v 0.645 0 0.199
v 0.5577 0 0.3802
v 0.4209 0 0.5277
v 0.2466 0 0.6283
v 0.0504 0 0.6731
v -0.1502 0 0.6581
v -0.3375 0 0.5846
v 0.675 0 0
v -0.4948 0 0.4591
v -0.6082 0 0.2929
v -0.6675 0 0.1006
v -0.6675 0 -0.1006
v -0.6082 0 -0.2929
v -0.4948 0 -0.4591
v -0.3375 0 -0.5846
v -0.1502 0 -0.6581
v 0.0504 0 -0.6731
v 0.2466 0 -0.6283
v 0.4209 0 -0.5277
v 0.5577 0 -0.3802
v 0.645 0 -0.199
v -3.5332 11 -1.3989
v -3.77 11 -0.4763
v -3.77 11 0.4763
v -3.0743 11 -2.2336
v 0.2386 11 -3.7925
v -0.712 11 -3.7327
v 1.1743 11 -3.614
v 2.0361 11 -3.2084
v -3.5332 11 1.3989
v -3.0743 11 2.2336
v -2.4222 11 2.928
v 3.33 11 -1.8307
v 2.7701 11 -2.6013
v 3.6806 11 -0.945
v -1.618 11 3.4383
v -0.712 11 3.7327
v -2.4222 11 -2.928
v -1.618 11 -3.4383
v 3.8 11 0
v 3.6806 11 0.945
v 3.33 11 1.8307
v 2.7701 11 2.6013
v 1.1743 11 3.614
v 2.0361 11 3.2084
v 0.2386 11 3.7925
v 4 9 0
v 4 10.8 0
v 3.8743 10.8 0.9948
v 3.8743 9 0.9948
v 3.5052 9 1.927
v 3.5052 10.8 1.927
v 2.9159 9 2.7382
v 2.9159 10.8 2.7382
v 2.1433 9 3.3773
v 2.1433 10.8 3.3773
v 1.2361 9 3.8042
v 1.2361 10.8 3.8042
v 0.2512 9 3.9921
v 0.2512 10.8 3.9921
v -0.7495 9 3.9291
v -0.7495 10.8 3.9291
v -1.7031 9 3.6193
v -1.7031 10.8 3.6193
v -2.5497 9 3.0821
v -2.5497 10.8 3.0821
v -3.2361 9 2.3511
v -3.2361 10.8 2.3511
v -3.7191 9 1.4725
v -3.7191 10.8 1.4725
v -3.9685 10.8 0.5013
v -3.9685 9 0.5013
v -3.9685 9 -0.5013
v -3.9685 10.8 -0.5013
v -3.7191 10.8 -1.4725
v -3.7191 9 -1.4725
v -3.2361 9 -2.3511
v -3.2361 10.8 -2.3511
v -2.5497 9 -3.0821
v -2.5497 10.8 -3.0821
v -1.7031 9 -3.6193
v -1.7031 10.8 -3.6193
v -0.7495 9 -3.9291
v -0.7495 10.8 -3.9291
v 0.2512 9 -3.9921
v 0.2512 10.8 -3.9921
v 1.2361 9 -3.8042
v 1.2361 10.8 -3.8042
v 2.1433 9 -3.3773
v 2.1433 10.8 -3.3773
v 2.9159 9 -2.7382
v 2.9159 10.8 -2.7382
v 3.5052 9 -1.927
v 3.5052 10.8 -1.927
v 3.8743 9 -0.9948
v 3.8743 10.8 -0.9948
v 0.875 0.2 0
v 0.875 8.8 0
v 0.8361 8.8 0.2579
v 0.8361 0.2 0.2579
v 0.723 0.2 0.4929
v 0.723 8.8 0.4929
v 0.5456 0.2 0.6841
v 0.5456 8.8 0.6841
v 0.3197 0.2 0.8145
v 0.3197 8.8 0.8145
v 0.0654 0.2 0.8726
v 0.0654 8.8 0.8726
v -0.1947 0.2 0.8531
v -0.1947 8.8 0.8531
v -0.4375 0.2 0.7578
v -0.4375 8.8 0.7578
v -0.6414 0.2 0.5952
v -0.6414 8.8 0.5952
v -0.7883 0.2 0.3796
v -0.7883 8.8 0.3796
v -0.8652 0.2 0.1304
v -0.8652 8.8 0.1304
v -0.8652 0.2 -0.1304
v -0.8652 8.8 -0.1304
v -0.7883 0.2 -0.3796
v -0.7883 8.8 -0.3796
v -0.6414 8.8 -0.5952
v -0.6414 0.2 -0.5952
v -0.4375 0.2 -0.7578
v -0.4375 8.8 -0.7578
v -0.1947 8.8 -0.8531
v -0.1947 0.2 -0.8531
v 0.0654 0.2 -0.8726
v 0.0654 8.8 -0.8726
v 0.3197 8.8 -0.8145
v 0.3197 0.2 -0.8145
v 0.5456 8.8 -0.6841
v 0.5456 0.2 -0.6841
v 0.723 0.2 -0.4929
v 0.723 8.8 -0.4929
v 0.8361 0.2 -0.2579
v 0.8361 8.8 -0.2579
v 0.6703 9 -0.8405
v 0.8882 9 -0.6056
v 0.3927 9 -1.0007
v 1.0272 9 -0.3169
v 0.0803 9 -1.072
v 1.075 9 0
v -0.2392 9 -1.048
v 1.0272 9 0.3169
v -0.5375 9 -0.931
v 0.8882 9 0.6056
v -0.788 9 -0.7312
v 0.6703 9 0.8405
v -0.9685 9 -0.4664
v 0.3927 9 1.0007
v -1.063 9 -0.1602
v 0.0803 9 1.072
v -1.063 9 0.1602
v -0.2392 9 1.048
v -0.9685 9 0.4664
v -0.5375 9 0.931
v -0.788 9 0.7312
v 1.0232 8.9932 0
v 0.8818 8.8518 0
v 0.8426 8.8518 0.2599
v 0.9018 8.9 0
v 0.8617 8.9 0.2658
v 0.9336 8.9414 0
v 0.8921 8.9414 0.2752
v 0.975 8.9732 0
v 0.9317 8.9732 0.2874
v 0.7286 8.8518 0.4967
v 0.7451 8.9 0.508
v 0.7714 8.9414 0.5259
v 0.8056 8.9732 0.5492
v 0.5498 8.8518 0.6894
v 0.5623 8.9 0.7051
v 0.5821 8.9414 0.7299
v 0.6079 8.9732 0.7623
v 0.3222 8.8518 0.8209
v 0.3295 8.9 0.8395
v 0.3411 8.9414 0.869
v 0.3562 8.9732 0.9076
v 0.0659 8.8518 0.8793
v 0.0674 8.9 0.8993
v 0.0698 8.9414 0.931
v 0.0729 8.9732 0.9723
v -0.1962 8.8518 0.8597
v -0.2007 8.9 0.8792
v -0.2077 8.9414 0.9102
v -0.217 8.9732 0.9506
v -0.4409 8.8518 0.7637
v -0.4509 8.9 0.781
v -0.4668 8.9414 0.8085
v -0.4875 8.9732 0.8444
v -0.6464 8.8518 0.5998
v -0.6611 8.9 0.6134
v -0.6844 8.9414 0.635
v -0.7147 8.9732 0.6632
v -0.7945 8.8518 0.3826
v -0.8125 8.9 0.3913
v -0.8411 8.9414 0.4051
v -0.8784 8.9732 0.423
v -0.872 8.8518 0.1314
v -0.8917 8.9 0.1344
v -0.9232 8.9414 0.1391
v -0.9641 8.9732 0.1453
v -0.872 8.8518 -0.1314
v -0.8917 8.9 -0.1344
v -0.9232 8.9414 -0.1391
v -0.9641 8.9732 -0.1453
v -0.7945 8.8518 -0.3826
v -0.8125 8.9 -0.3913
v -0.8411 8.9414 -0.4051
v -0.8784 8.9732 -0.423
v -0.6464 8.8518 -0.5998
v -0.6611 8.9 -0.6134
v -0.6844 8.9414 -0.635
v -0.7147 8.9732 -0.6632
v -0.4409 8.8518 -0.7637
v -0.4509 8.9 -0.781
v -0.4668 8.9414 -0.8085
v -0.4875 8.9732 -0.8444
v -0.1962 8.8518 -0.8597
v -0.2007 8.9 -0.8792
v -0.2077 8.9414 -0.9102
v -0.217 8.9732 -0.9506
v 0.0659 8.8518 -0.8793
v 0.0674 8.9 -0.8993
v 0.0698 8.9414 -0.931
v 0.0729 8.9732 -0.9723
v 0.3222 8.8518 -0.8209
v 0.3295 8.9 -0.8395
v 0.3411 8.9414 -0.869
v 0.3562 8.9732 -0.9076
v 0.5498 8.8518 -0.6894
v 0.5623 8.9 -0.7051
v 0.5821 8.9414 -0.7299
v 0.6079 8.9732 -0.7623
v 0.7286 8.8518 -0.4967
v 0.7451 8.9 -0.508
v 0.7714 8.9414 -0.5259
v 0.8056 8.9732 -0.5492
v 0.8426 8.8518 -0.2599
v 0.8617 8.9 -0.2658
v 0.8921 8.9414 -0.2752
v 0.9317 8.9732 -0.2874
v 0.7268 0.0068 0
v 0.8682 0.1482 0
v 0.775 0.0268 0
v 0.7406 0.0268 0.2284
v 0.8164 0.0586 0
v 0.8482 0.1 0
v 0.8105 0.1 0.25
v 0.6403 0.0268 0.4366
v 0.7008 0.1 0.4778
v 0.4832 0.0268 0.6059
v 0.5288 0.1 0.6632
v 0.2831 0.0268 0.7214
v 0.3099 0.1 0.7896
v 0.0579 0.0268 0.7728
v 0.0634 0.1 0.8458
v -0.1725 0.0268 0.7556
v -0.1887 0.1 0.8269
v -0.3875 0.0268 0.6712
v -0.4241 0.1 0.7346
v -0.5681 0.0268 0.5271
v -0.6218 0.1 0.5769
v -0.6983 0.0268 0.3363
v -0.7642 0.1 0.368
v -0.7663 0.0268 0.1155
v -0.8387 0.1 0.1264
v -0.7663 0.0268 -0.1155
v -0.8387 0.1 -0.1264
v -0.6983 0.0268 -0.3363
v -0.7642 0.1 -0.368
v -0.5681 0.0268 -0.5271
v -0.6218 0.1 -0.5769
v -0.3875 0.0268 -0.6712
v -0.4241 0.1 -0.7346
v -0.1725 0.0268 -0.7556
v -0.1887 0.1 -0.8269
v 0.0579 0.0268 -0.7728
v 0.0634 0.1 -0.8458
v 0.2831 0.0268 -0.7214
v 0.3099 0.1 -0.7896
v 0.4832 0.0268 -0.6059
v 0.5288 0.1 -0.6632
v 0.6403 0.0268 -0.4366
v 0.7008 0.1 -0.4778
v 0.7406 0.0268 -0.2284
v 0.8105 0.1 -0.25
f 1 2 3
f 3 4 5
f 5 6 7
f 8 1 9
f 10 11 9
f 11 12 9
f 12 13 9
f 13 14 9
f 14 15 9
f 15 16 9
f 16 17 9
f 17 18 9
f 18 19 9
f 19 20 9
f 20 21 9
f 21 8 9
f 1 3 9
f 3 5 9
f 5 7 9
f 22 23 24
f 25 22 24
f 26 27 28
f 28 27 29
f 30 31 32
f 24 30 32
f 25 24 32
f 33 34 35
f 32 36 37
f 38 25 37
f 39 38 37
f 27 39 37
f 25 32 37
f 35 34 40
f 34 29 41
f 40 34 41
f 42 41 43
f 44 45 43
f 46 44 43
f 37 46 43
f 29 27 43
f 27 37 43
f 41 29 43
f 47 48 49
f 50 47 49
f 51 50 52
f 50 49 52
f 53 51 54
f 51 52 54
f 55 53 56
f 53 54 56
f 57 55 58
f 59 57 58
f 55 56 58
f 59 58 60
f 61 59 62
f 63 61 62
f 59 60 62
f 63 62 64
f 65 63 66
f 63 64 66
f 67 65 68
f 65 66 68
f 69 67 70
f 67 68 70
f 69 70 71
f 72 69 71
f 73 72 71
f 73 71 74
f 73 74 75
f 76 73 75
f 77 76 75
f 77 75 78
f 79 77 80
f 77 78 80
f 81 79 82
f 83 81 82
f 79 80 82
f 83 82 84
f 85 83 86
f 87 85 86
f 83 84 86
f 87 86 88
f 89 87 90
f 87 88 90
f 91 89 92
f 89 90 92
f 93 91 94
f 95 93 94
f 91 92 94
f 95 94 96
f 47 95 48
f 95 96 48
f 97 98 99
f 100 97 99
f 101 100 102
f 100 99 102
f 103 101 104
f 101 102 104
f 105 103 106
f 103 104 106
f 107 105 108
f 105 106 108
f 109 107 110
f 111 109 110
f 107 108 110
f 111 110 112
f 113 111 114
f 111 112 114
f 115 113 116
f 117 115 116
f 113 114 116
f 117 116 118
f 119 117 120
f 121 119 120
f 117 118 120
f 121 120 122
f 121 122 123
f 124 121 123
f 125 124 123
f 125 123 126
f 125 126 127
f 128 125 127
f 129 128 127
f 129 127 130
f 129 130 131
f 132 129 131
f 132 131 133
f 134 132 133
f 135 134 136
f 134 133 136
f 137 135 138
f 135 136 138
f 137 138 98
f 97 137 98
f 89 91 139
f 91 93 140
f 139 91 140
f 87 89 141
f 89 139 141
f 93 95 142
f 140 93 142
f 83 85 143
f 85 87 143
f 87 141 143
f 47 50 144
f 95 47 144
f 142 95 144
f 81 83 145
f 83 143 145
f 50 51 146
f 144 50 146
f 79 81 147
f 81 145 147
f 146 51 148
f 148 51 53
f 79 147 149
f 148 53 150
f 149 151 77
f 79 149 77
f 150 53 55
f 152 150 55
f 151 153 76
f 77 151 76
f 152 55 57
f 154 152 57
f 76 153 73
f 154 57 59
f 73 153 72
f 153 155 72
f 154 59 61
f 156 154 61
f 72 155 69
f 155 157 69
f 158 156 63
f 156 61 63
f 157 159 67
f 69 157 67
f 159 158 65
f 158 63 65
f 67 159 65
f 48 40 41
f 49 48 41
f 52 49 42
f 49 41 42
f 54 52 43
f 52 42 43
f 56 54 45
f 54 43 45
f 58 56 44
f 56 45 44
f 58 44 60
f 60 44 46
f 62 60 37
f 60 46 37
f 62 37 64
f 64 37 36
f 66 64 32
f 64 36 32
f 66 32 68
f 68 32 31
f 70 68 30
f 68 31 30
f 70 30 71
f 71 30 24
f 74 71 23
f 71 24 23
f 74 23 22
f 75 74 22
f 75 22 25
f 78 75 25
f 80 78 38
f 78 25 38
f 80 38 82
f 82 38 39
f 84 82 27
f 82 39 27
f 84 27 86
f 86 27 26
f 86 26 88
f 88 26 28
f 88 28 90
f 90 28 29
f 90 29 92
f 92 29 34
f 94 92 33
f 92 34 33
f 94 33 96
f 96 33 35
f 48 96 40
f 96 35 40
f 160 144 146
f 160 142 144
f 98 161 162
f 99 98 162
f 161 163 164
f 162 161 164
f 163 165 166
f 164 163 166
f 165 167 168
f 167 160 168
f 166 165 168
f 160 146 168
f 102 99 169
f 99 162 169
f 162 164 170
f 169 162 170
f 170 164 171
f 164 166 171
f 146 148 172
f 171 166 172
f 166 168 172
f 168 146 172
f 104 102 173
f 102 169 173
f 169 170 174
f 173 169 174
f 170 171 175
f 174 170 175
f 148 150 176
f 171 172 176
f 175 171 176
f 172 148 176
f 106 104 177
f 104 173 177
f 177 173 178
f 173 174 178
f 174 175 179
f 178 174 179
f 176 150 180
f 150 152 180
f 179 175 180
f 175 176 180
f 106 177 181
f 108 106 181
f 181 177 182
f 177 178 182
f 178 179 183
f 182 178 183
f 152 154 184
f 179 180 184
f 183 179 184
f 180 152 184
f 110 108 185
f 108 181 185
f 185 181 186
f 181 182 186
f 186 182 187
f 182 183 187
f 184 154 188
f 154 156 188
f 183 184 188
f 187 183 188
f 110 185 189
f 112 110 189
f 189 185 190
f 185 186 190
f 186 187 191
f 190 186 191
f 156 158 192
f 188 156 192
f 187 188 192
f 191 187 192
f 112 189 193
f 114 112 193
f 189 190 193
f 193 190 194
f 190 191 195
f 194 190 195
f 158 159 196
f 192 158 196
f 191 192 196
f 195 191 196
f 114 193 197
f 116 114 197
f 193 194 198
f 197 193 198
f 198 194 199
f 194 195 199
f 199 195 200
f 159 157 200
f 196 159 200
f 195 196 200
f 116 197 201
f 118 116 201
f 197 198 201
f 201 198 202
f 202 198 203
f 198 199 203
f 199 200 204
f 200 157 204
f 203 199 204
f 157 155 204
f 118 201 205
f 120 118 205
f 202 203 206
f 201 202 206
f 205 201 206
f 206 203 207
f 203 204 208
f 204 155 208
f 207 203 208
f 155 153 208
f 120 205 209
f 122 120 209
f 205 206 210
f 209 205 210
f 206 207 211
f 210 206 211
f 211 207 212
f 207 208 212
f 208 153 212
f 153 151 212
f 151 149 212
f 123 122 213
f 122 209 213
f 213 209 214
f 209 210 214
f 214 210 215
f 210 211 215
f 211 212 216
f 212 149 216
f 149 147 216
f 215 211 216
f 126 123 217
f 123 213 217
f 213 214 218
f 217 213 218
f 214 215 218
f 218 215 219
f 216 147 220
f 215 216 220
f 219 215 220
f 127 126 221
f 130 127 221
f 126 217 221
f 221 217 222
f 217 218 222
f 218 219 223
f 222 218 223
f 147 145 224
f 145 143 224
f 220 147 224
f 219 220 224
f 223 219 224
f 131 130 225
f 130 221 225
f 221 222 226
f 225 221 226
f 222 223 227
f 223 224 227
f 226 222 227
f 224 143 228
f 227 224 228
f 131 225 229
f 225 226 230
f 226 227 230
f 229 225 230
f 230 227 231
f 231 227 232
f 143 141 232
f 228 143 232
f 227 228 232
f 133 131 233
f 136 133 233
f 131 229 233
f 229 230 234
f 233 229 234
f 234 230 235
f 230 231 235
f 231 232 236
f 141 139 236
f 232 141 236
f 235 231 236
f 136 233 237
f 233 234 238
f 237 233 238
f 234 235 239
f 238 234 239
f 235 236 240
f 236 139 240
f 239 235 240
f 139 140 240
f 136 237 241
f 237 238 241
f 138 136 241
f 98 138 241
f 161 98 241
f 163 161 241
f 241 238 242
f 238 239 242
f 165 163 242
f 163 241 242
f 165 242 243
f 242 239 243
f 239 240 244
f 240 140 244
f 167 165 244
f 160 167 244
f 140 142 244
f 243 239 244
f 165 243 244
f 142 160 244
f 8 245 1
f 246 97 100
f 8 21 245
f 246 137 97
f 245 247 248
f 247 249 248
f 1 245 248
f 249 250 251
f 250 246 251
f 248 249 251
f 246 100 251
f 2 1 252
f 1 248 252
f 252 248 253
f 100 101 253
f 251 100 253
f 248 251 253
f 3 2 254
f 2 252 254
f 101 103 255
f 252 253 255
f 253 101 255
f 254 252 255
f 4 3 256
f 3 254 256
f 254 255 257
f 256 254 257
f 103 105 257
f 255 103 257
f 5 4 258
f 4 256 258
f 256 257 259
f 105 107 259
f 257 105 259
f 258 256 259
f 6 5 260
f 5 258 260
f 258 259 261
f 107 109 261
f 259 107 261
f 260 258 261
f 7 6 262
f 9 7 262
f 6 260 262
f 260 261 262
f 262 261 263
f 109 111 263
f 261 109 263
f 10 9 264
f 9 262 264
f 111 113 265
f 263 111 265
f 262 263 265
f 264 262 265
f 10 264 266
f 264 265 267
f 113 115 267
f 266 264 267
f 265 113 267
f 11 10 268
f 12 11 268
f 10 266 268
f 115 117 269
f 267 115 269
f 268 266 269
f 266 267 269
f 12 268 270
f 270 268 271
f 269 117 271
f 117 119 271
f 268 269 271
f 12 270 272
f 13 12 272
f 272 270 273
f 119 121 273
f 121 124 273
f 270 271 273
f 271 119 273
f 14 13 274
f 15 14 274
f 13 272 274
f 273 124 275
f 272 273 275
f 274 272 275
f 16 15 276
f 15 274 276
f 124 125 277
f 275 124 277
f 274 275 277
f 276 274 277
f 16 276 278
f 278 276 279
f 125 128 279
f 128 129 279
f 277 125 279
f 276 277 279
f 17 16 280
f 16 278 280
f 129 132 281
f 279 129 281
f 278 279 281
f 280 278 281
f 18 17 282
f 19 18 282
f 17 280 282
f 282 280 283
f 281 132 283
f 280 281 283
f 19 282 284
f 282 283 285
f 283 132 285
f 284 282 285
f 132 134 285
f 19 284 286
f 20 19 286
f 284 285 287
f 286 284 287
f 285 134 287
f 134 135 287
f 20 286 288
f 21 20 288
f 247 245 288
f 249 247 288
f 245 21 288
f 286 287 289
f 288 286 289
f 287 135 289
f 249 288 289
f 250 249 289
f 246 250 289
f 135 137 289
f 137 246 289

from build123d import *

# Parameters (mm, degrees)
FILLET1_R     = 0.2
CHAMFER1_SIZE = 0.2


with BuildPart() as part:
    # Sketch2 → Revolve1 (revolve)
    with BuildSketch(Plane.XY):
        Polygon((0, 0), (0.875, 0), (0.875, 9), (4, 9), (4, 11), (0, 11), align=None)
    revolve(axis=Axis((0, 11, 0), (0, -1, 0)))

    # Fillet1
    fillet1_edges = [part.edges().sort_by_distance(p)[0] for p in [
        (-0.875, 9, 0),
        (-0.875, 0, 0),
    ]]
    fillet(fillet1_edges, radius=FILLET1_R)

    # Chamfer1
    chamfer1_edges = [part.edges().sort_by_distance(p)[0] for p in [
        (-4, 11, 0),
    ]]
    chamfer(chamfer1_edges, length=CHAMFER1_SIZE)


solid = part.part
